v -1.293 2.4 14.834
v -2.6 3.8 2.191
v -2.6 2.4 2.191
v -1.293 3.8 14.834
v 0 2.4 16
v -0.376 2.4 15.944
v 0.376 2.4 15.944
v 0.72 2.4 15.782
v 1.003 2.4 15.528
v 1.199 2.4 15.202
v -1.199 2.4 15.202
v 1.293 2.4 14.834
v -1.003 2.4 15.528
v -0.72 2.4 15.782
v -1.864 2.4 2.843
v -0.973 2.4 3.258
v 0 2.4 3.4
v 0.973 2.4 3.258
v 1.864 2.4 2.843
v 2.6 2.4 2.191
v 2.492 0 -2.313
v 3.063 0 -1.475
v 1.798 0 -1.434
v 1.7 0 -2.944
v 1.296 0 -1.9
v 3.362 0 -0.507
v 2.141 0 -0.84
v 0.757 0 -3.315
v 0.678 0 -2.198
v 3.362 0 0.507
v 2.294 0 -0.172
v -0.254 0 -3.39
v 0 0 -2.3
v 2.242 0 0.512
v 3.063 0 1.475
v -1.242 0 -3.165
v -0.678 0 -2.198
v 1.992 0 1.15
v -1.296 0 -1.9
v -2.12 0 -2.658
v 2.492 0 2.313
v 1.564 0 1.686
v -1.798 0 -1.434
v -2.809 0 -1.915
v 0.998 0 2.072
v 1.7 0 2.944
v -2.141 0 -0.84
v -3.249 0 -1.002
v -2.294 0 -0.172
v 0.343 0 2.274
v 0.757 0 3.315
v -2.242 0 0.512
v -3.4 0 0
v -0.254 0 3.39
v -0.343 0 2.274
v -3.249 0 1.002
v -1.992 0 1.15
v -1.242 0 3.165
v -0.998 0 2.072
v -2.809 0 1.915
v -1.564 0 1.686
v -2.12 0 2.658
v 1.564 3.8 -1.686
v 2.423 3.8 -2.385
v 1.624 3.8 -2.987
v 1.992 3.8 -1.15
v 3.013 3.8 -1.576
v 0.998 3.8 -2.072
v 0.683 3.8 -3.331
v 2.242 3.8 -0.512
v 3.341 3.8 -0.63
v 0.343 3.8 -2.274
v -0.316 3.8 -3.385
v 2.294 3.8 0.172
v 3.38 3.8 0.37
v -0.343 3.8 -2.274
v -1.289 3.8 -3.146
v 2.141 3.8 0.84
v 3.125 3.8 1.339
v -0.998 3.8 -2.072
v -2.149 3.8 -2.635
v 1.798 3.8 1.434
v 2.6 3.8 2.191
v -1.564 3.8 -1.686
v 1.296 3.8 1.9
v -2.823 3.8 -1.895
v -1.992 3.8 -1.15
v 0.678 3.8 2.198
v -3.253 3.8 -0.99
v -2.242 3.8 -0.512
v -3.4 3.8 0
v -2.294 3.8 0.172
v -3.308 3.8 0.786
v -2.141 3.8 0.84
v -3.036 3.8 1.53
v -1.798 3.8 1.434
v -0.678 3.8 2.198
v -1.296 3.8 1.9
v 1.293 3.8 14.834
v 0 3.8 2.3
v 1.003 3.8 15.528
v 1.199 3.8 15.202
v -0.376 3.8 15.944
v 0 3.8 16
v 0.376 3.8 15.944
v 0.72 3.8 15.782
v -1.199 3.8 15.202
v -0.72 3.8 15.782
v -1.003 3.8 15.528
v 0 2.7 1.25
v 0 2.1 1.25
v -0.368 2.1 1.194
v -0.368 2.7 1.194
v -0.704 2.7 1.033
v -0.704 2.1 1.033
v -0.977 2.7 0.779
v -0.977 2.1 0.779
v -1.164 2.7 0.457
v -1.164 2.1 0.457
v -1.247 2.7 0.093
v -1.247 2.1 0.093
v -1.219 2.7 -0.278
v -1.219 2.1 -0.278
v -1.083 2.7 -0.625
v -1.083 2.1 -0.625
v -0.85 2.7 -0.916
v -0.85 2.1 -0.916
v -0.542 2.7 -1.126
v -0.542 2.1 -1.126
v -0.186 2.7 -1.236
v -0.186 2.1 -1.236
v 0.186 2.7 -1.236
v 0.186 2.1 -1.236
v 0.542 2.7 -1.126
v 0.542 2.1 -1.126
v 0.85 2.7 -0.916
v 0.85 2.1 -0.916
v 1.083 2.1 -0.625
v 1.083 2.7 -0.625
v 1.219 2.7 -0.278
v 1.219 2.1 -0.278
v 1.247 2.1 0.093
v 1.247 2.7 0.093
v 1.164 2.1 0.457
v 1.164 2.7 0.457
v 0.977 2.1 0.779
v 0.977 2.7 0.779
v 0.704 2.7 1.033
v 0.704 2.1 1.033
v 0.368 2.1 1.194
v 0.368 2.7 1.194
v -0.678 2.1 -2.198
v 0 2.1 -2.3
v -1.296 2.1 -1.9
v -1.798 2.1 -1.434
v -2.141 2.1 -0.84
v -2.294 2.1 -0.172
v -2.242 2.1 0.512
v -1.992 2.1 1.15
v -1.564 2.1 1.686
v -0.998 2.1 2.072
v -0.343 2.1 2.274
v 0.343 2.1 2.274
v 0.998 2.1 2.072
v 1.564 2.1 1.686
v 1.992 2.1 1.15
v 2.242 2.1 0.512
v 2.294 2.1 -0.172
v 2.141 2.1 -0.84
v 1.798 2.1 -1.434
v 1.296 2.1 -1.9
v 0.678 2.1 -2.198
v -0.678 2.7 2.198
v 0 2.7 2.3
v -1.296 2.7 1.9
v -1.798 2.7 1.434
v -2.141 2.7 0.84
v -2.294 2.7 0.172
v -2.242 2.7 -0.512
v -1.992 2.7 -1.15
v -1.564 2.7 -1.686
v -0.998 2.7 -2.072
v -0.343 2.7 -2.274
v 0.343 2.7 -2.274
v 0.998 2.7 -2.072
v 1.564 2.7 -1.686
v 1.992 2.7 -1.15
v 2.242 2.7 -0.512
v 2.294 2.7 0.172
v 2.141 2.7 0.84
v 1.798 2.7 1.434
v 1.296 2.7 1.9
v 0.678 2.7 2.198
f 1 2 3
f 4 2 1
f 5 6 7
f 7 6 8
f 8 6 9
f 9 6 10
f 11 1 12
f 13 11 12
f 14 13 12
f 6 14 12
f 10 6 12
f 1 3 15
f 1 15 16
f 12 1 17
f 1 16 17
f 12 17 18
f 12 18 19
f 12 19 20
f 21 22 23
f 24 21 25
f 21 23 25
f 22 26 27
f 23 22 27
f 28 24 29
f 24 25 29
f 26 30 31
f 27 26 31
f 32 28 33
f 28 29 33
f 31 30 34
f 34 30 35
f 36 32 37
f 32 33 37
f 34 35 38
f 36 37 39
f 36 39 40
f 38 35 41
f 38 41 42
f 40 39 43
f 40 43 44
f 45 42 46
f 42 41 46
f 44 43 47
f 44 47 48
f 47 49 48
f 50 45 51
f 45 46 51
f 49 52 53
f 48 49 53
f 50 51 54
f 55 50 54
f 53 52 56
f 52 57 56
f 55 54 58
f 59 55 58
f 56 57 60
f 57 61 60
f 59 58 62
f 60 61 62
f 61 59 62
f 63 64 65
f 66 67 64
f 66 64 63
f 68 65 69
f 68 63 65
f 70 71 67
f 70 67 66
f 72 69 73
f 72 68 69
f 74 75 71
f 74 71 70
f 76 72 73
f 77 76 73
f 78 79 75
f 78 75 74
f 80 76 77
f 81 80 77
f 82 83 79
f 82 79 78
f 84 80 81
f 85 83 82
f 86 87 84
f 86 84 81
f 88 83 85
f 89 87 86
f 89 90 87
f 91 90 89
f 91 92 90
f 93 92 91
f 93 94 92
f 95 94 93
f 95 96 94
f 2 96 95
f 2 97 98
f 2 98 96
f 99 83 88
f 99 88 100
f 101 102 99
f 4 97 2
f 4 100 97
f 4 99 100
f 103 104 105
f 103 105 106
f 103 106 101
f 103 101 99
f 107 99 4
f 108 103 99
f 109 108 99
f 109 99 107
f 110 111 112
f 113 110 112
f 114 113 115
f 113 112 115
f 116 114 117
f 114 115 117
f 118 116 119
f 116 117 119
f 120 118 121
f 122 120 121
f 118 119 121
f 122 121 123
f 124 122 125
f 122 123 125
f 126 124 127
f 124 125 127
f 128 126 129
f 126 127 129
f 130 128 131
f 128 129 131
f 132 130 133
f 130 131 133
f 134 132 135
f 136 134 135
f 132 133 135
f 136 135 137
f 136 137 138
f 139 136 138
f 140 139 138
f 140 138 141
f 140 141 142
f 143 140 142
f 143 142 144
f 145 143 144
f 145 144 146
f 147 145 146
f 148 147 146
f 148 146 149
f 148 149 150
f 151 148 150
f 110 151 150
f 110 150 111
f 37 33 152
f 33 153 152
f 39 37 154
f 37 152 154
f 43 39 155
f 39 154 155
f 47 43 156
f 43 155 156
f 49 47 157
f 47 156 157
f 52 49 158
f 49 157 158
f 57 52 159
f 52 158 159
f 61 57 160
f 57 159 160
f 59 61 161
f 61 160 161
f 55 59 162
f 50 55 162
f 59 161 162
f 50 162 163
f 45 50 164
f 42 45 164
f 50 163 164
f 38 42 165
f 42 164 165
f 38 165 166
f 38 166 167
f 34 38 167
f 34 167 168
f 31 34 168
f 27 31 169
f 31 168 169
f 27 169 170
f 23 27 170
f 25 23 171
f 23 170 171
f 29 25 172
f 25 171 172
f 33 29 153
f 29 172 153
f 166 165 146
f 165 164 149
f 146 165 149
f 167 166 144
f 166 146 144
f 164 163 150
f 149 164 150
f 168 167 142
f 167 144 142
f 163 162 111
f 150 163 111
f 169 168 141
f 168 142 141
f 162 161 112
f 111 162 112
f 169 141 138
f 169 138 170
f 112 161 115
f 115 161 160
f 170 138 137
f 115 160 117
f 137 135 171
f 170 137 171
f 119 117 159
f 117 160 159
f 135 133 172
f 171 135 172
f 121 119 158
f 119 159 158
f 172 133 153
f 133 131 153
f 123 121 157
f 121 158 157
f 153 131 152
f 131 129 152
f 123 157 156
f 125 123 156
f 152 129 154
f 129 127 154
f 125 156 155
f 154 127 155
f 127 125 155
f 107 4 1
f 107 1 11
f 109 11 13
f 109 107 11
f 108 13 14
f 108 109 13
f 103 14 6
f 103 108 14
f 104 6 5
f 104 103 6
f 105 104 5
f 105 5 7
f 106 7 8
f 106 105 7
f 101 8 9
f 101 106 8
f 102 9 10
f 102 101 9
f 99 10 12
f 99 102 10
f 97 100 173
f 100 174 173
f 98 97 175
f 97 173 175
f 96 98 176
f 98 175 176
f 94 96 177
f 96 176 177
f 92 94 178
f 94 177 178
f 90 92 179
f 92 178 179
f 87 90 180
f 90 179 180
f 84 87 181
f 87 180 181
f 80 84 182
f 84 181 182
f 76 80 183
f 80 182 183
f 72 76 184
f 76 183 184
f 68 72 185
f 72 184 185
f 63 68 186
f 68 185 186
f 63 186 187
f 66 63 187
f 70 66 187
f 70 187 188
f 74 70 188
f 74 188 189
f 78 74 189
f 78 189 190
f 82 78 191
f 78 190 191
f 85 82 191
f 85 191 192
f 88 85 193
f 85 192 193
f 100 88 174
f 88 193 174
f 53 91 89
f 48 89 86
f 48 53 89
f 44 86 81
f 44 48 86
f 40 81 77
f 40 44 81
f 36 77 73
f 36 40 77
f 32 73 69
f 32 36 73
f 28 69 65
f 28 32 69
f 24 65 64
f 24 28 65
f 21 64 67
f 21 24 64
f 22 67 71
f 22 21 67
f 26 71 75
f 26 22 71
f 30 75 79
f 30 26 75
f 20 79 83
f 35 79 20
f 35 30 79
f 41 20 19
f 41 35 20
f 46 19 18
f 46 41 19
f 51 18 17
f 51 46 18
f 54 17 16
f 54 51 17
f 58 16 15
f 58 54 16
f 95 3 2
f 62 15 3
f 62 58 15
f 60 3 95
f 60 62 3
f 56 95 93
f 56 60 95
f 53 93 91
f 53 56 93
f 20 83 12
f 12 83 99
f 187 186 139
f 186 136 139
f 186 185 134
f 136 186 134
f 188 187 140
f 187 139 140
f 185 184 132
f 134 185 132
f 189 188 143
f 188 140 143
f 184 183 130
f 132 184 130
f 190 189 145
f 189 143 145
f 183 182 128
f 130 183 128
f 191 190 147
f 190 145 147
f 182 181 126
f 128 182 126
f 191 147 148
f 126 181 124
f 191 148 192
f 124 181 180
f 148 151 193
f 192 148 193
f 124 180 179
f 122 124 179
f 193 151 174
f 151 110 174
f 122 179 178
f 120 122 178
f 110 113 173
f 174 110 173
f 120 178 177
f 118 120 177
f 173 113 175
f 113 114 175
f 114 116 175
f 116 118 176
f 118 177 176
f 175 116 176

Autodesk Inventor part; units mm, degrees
ref_plane "YZ Plane" through (0, 0, 0) normal (1, 0, 0) x (0, 1, 0)
ref_plane "XZ Plane" through (0, 0, 0) normal (0, 1, 0) x (-1, 0, 0)
ref_plane "XY Plane" through (0, 0, 0) normal (0, 0, 1) x (1, 0, 0)
sketch "스케치1" plane through (0, 0, 0) normal (0, 1, 0) x (-1, 0, 0)
  circle A0 centre (0, 0) radius 3.4
  dimension "d0" = 6.8
extrude "돌출1" add sketch "스케치1" along normal blind 3.8
hole "구멍1" at (0, 3.8, 0) direction (0, -1, 0) diameter 2.5 end through all
hole "구멍2" at (0, 3.8, 0) direction (0, -1, 0) diameter 4.6 depth 1.1
hole "구멍3" at (0, 0, 0) direction (0, 1, 0) diameter 4.6 depth 2.1
sketch "스케치2" plane through (0, 3.8, 0) normal (0, 1, 0) x (1, 0, 0)
  line L0 (0, 3.4) -> (0, -16)
  line L1 (-2.6, -2.1909) -> (-1.2931, -14.8337)
  arc A0 (0, 3.4) -> (-2.6, -2.1909) centre (0, 0) ccw
  arc A1 (-1.2931, -14.8337) -> (0, -16) centre (0, -14.7) ccw
  line L2 (2.6, -2.1909) -> (1.2931, -14.8337)
  arc A2 (2.6, -2.1909) -> (0, 3.4) centre (0, 0) ccw
  arc A3 (0, -16) -> (1.2931, -14.8337) centre (0, -14.7) ccw
  arc A4 (-2.6, -2.1909) -> (2.6, -2.1909) centre (0, 0) ccw
  dimension "d34" = 19.4
extrude "돌출2" add sketch "스케치2" against normal blind 1.4 contours A4 L2 A3 L0 | L0 A1 L1 A4
properties part number "SG90 SingleArm"
